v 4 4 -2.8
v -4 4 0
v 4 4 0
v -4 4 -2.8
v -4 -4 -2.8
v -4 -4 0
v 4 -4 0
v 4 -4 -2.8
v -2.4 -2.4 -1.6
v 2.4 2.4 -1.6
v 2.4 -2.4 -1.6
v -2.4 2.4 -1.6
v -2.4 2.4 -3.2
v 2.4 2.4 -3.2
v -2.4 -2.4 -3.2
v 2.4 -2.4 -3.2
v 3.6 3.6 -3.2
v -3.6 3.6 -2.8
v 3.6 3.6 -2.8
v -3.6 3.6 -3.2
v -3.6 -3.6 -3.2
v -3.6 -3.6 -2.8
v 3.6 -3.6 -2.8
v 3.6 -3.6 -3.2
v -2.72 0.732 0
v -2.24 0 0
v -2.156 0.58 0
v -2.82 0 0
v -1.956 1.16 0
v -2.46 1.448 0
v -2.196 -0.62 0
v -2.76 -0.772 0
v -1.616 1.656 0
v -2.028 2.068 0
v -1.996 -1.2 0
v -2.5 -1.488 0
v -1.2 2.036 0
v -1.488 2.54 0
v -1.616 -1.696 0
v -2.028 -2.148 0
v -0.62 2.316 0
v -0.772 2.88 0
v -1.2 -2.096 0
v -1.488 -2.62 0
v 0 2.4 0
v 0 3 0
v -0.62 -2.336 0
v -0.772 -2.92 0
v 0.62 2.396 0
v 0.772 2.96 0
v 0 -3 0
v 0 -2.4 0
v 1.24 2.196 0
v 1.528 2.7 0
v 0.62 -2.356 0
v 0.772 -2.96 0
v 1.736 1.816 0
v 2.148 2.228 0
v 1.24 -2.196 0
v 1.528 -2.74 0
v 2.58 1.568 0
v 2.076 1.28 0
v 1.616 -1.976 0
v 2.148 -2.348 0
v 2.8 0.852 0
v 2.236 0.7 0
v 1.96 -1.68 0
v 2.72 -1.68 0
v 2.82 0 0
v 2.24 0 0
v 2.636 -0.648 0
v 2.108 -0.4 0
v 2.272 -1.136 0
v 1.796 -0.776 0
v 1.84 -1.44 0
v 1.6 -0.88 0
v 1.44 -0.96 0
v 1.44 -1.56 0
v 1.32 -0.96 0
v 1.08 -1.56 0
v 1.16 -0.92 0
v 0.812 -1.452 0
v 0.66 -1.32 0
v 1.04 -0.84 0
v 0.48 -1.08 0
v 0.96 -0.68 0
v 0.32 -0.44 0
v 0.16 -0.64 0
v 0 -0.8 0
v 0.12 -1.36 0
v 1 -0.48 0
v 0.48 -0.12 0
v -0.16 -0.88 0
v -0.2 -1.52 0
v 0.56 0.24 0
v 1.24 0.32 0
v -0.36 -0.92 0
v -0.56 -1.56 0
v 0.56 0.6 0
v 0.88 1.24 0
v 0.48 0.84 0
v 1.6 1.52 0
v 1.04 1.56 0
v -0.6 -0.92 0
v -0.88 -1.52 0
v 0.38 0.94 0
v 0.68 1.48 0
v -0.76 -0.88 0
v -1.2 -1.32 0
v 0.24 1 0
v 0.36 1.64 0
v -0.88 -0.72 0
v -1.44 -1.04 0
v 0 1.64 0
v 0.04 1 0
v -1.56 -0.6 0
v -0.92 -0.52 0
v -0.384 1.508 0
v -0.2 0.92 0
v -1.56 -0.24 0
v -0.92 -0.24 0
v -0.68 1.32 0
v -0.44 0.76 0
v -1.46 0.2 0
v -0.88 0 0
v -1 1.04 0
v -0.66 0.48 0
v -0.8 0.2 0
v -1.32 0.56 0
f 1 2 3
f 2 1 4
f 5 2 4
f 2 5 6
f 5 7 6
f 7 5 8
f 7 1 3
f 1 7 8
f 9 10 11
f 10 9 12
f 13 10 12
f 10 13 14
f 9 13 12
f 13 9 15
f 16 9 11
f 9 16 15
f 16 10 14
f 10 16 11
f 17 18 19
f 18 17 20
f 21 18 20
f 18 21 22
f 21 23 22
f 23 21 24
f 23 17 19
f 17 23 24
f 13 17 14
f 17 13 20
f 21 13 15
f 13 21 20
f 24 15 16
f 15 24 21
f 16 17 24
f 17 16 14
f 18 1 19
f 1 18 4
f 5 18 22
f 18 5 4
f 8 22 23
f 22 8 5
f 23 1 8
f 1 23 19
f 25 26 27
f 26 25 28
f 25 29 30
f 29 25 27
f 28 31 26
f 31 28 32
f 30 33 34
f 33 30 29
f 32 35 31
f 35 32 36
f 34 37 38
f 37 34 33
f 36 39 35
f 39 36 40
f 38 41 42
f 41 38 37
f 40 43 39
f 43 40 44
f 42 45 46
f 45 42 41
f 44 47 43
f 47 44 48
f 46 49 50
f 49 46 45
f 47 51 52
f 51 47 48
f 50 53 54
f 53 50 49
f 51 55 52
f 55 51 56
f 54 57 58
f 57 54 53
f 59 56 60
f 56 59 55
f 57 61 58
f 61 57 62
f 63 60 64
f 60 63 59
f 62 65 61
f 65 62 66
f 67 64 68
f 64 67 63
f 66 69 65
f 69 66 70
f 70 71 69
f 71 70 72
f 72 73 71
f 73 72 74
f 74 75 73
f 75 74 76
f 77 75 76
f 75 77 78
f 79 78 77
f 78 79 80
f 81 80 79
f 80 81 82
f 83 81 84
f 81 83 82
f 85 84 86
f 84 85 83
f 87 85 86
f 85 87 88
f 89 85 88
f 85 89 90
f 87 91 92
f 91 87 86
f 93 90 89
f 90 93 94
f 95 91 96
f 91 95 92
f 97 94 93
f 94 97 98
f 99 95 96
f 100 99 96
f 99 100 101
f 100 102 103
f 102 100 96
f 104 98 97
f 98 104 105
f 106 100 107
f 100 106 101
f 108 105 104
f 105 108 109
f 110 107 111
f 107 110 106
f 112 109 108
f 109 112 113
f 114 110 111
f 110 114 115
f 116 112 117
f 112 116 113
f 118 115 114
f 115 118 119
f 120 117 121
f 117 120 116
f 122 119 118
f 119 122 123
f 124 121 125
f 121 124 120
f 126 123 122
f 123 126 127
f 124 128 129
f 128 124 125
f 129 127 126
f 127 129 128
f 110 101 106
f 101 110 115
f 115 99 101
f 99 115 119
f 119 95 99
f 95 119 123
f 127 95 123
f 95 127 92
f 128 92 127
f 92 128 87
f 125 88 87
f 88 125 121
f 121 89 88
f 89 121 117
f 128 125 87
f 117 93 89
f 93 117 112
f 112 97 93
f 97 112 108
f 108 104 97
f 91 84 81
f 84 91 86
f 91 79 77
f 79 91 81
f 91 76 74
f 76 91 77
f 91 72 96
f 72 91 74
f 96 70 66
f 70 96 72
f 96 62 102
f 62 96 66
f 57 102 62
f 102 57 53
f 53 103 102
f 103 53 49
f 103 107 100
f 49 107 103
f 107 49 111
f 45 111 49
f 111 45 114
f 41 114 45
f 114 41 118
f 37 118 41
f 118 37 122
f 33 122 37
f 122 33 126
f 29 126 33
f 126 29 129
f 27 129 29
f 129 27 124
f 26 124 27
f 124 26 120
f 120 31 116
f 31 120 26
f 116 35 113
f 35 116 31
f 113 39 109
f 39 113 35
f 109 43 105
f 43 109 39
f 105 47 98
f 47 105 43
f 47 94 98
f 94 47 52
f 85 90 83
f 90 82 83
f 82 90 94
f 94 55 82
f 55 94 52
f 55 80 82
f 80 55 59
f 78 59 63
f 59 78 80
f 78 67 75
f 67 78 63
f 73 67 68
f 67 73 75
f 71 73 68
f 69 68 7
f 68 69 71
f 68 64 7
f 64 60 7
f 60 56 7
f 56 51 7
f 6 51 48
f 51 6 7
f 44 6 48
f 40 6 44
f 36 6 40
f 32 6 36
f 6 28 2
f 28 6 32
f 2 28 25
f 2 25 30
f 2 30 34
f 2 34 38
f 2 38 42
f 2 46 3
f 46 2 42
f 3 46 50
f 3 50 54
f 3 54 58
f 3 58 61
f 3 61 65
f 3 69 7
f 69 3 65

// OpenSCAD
// file: ../p/box5.scad
use <../lib.scad>
function ldraw_lib__box5() = [
// 0 Box with 5 Faces and All Edges
// 0 Name: box5.dat
// 0 Author: James Jessiman
// 0 !LDRAW_ORG Primitive UPDATE 2012-01
// 0 !LICENSE Licensed under CC BY 4.0 : see CAreadme.txt
// 
// 0 BFC CERTIFY CCW
  [0,"BFC","CERTIFY"],
  [0,"BFC","CCW"],
// 
// 0 !HISTORY 2002-04-03 [sbliss] Modified for BFC compliance
// 0 !HISTORY 2002-04-25 [PTadmin] Official Update 2002-02
// 0 !HISTORY 2007-06-24 [PTadmin] Header formatted for Contributor Agreement
// 0 !HISTORY 2008-07-01 [PTadmin] Official Update 2008-01
// 0 !HISTORY 2012-02-16 [Philo] Changed to CCW
// 0 !HISTORY 2012-03-30 [PTadmin] Official Update 2012-01
// 
// 
// 2 24 1 1 1 -1 1 1
  [2,24,1,1,1,-1,1,1],
// 2 24 -1 1 1 -1 1 -1
  [2,24,-1,1,1,-1,1,-1],
// 2 24 -1 1 -1 1 1 -1
  [2,24,-1,1,-1,1,1,-1],
// 2 24 1 1 -1 1 1 1
  [2,24,1,1,-1,1,1,1],
// 2 24 1 0 1 -1 0 1
  [2,24,1,0,1,-1,0,1],
// 2 24 -1 0 1 -1 0 -1
  [2,24,-1,0,1,-1,0,-1],
// 2 24 -1 0 -1 1 0 -1
  [2,24,-1,0,-1,1,0,-1],
// 2 24 1 0 -1 1 0 1
  [2,24,1,0,-1,1,0,1],
// 2 24 1 0 1 1 1 1
  [2,24,1,0,1,1,1,1],
// 2 24 -1 0 1 -1 1 1
  [2,24,-1,0,1,-1,1,1],
// 2 24 1 0 -1 1 1 -1
  [2,24,1,0,-1,1,1,-1],
// 2 24 -1 0 -1 -1 1 -1
  [2,24,-1,0,-1,-1,1,-1],
// 4 16 -1 1 1 1 1 1 1 1 -1 -1 1 -1
  [4,16,-1,1,1,1,1,1,1,1,-1,-1,1,-1],
// 4 16 -1 1 1 -1 0 1 1 0 1 1 1 1
  [4,16,-1,1,1,-1,0,1,1,0,1,1,1,1],
// 4 16 -1 1 -1 -1 0 -1 -1 0 1 -1 1 1
  [4,16,-1,1,-1,-1,0,-1,-1,0,1,-1,1,1],
// 4 16 1 1 -1 1 0 -1 -1 0 -1 -1 1 -1
  [4,16,1,1,-1,1,0,-1,-1,0,-1,-1,1,-1],
// 4 16 1 1 1 1 0 1 1 0 -1 1 1 -1
  [4,16,1,1,1,1,0,1,1,0,-1,1,1,-1],
];
module ldraw_lib__box5(step=0, col=false, unit=2/5, alt=false, line=0.2, solid=!$preview)
    makepoly(ldraw_lib__box5(), step=step, col=col, unit=unit, alt=alt, line=line, solid=solid);
ldraw_lib__box5(line=0.2);
// file: ../p/box4.scad
use <../lib.scad>
function ldraw_lib__box4() = [
// 0 Box with 4 Faces (2 Parallel Pairs) and All Edges
// 0 Name: box4.dat
// 0 Author: James Jessiman
// 0 !LDRAW_ORG Primitive UPDATE 2012-01
// 0 !LICENSE Licensed under CC BY 4.0 : see CAreadme.txt
// 
// 0 BFC CERTIFY CCW
  [0,"BFC","CERTIFY"],
  [0,"BFC","CCW"],
// 
// 0 !HISTORY 2002-04-03 [sbliss] Modified for BFC compliance
// 0 !HISTORY 2002-04-25 [PTadmin] Official Update 2002-02
// 0 !HISTORY 2007-06-24 [PTadmin] Header formatted for Contributor Agreement
// 0 !HISTORY 2008-07-01 [PTadmin] Official Update 2008-01
// 0 !HISTORY 2012-02-16 [Philo] Changed to CCW
// 0 !HISTORY 2012-03-30 [PTadmin] Official Update 2012-01
// 
// 
// 2 24 1 1 1 -1 1 1
  [2,24,1,1,1,-1,1,1],
// 2 24 -1 1 1 -1 1 -1
  [2,24,-1,1,1,-1,1,-1],
// 2 24 -1 1 -1 1 1 -1
  [2,24,-1,1,-1,1,1,-1],
// 2 24 1 1 -1 1 1 1
  [2,24,1,1,-1,1,1,1],
// 2 24 1 0 1 -1 0 1
  [2,24,1,0,1,-1,0,1],
// 2 24 -1 0 1 -1 0 -1
  [2,24,-1,0,1,-1,0,-1],
// 2 24 -1 0 -1 1 0 -1
  [2,24,-1,0,-1,1,0,-1],
// 2 24 1 0 -1 1 0 1
  [2,24,1,0,-1,1,0,1],
// 2 24 1 0 1 1 1 1
  [2,24,1,0,1,1,1,1],
// 2 24 -1 0 1 -1 1 1
  [2,24,-1,0,1,-1,1,1],
// 2 24 1 0 -1 1 1 -1
  [2,24,1,0,-1,1,1,-1],
// 2 24 -1 0 -1 -1 1 -1
  [2,24,-1,0,-1,-1,1,-1],
// 4 16 -1 1 1 -1 0 1 1 0 1 1 1 1
  [4,16,-1,1,1,-1,0,1,1,0,1,1,1,1],
// 4 16 -1 1 -1 -1 0 -1 -1 0 1 -1 1 1
  [4,16,-1,1,-1,-1,0,-1,-1,0,1,-1,1,1],
// 4 16 1 1 -1 1 0 -1 -1 0 -1 -1 1 -1
  [4,16,1,1,-1,1,0,-1,-1,0,-1,-1,1,-1],
// 4 16 1 1 1 1 0 1 1 0 -1 1 1 -1
  [4,16,1,1,1,1,0,1,1,0,-1,1,1,-1],
];
module ldraw_lib__box4(step=0, col=false, unit=2/5, alt=false, line=0.2, solid=!$preview)
    makepoly(ldraw_lib__box4(), step=step, col=col, unit=unit, alt=alt, line=line, solid=solid);
ldraw_lib__box4(line=0.2);
// file: s/3070bs01.scad
use <../../lib.scad>
use <../../p/box4.scad>
use <../../p/box5.scad>
function ldraw_lib__s__3070bs01() = [
// 0 ~Tile  1 x  1 with Groove without Top Face
// 0 Name: s\3070bs01.dat
// 0 Author: Chris Dee [cwdee]
// 0 !LDRAW_ORG Subpart UPDATE 2009-02
// 0 !LICENSE Licensed under CC BY 4.0 : see CAreadme.txt
// 
// 0 BFC CERTIFY CCW
  [0,"BFC","CERTIFY"],
  [0,"BFC","CCW"],
// 
// 0 !HISTORY 2009-09-03 [PTadmin] Official Update 2009-02
// 
// 
// 1 16 0 0 0 10 0 0 0 7 0 0 0 10 box4.dat
  [1,16,0,0,0,10,0,0,0,7,0,0,0,10, ldraw_lib__box4()],
// 0 BFC INVERTNEXT
  [0,"BFC","INVERTNEXT"],
// 1 16 0 8 0 6 0 0 0 -4 0 0 0 6 box5.dat
  [1,16,0,8,0,6,0,0,0,-4,0,0,0,6, ldraw_lib__box5()],
// 1 16 0 7 0 9 0 0 0 1 0 0 0 9 box4.dat
  [1,16,0,7,0,9,0,0,0,1,0,0,0,9, ldraw_lib__box4()],
// 
// 4 16 9 8 9 6 8 6 -6 8 6 -9 8 9
  [4,16,9,8,9,6,8,6,-6,8,6,-9,8,9],
// 4 16 -9 8 9 -6 8 6 -6 8 -6 -9 8 -9
  [4,16,-9,8,9,-6,8,6,-6,8,-6,-9,8,-9],
// 4 16 -9 8 -9 -6 8 -6 6 8 -6 9 8 -9
  [4,16,-9,8,-9,-6,8,-6,6,8,-6,9,8,-9],
// 4 16 9 8 -9 6 8 -6 6 8 6 9 8 9
  [4,16,9,8,-9,6,8,-6,6,8,6,9,8,9],
// 
// 4 16 10 7 10 9 7 9 -9 7 9 -10 7 10
  [4,16,10,7,10,9,7,9,-9,7,9,-10,7,10],
// 4 16 -10 7 10 -9 7 9 -9 7 -9 -10 7 -10
  [4,16,-10,7,10,-9,7,9,-9,7,-9,-10,7,-10],
// 4 16 -10 7 -10 -9 7 -9 9 7 -9 10 7 -10
  [4,16,-10,7,-10,-9,7,-9,9,7,-9,10,7,-10],
// 4 16 10 7 -10 9 7 -9 9 7 9 10 7 10
  [4,16,10,7,-10,9,7,-9,9,7,9,10,7,10],
// 0
];
module ldraw_lib__s__3070bs01(step=0, col=false, unit=2/5, alt=false, line=0.2, solid=!$preview)
    makepoly(ldraw_lib__s__3070bs01(), step=step, col=col, unit=unit, alt=alt, line=line, solid=solid);
ldraw_lib__s__3070bs01(line=0.2);
// main file
use <../lib.scad>
use <s/3070bs01.scad>
function ldraw_lib__3070bpuj() = [
// 0 Tile  1 x  1 with Silver "@" Pattern
// 0 Name: 3070bpuj.dat
// 0 Author: Magnus Forsberg [MagFors]
// 0 !LDRAW_ORG Part UPDATE 2015-02
// 0 !LICENSE Licensed under CC BY 4.0 : see CAreadme.txt
// 
// 0 BFC CERTIFY CCW
  [0,"BFC","CERTIFY"],
  [0,"BFC","CCW"],
// 
// 0 !KEYWORDS arobase, arroba, at, at sign, BrickLink 3070pb072, Commercial at
// 0 !KEYWORDS Rebrickable 3070bpr0102, Set 850425
// 
// 0 !HISTORY 2015-12-30 [PTadmin] Official Update 2015-02
// 
// 
// 1 16 0 0 0 1 0 0 0 1 0 0 0 1 s\3070bs01.dat
  [1,16,0,0,0,1,0,0,0,1,0,0,0,1, ldraw_lib__s__3070bs01()],
// 
// 4 80 -5.6 0 0 -5.39 0 1.45 -6.8 0 1.83 -7.05 0 0
  [4,80,-5.6,0,0,-5.39,0,1.45,-6.8,0,1.83,-7.05,0,0],
// 4 80 -6.15 0 3.62 -6.8 0 1.83 -5.39 0 1.45 -4.89 0 2.9
  [4,80,-6.15,0,3.62,-6.8,0,1.83,-5.39,0,1.45,-4.89,0,2.9],
// 4 80 -5.49 0 -1.55 -5.6 0 0 -7.05 0 0 -6.9 0 -1.93
  [4,80,-5.49,0,-1.55,-5.6,0,0,-7.05,0,0,-6.9,0,-1.93],
// 4 80 -5.07 0 5.17 -6.15 0 3.62 -4.89 0 2.9 -4.04 0 4.14
  [4,80,-5.07,0,5.17,-6.15,0,3.62,-4.89,0,2.9,-4.04,0,4.14],
// 4 80 -4.99 0 -3 -5.49 0 -1.55 -6.9 0 -1.93 -6.25 0 -3.72
  [4,80,-4.99,0,-3,-5.49,0,-1.55,-6.9,0,-1.93,-6.25,0,-3.72],
// 4 80 -3.72 0 6.35 -5.07 0 5.17 -4.04 0 4.14 -3 0 5.09
  [4,80,-3.72,0,6.35,-5.07,0,5.17,-4.04,0,4.14,-3,0,5.09],
// 4 80 -4.04 0 -4.24 -4.99 0 -3 -6.25 0 -3.72 -5.07 0 -5.37
  [4,80,-4.04,0,-4.24,-4.99,0,-3,-6.25,0,-3.72,-5.07,0,-5.37],
// 4 80 -1.93 0 7.2 -3.72 0 6.35 -3 0 5.09 -1.55 0 5.79
  [4,80,-1.93,0,7.2,-3.72,0,6.35,-3,0,5.09,-1.55,0,5.79],
// 4 80 -3 0 -5.24 -4.04 0 -4.24 -5.07 0 -5.37 -3.72 0 -6.55
  [4,80,-3,0,-5.24,-4.04,0,-4.24,-5.07,0,-5.37,-3.72,0,-6.55],
// 4 80 0 0 7.5 -1.93 0 7.2 -1.55 0 5.79 0 0 6
  [4,80,0,0,7.5,-1.93,0,7.2,-1.55,0,5.79,0,0,6],
// 4 80 -1.55 0 -5.84 -3 0 -5.24 -3.72 0 -6.55 -1.93 0 -7.3
  [4,80,-1.55,0,-5.84,-3,0,-5.24,-3.72,0,-6.55,-1.93,0,-7.3],
// 4 80 1.93 0 7.4 0 0 7.5 0 0 6 1.55 0 5.99
  [4,80,1.93,0,7.4,0,0,7.5,0,0,6,1.55,0,5.99],
// 4 80 0 0 -6 -1.55 0 -5.84 -1.93 0 -7.3 0 0 -7.5
  [4,80,0,0,-6,-1.55,0,-5.84,-1.93,0,-7.3,0,0,-7.5],
// 4 80 3.82 0 6.75 1.93 0 7.4 1.55 0 5.99 3.1 0 5.49
  [4,80,3.82,0,6.75,1.93,0,7.4,1.55,0,5.99,3.1,0,5.49],
// 4 80 1.55 0 -5.89 0 0 -6 0 0 -7.5 1.93 0 -7.4
  [4,80,1.55,0,-5.89,0,0,-6,0,0,-7.5,1.93,0,-7.4],
// 4 80 5.37 0 5.57 3.82 0 6.75 3.1 0 5.49 4.34 0 4.54
  [4,80,5.37,0,5.57,3.82,0,6.75,3.1,0,5.49,4.34,0,4.54],
// 4 80 3.1 0 -5.49 1.55 0 -5.89 1.93 0 -7.4 3.82 0 -6.85
  [4,80,3.1,0,-5.49,1.55,0,-5.89,1.93,0,-7.4,3.82,0,-6.85],
// 4 80 6.45 0 3.92 5.37 0 5.57 4.34 0 4.54 5.19 0 3.2
  [4,80,6.45,0,3.92,5.37,0,5.57,4.34,0,4.54,5.19,0,3.2],
// 4 80 4.04 0 -4.94 3.1 0 -5.49 3.82 0 -6.85 5.37 0 -5.87
  [4,80,4.04,0,-4.94,3.1,0,-5.49,3.82,0,-6.85,5.37,0,-5.87],
// 4 80 7 0 2.13 6.45 0 3.92 5.19 0 3.2 5.59 0 1.75
  [4,80,7,0,2.13,6.45,0,3.92,5.19,0,3.2,5.59,0,1.75],
// 4 80 4.9 0 -4.2 4.04 0 -4.94 5.37 0 -5.87 6.8 0 -4.2
  [4,80,4.9,0,-4.2,4.04,0,-4.94,5.37,0,-5.87,6.8,0,-4.2],
// 4 80 7.05 0 0 7 0 2.13 5.59 0 1.75 5.6 0 0
  [4,80,7.05,0,0,7,0,2.13,5.59,0,1.75,5.6,0,0],
// 4 80 6.59 0 -1.62 7.05 0 0 5.6 0 0 5.27 0 -1
  [4,80,6.59,0,-1.62,7.05,0,0,5.6,0,0,5.27,0,-1],
// 4 80 5.68 0 -2.84 6.59 0 -1.62 5.27 0 -1 4.49 0 -1.94
  [4,80,5.68,0,-2.84,6.59,0,-1.62,5.27,0,-1,4.49,0,-1.94],
// 4 80 4 0 -2.2 4.6 0 -3.6 5.68 0 -2.84 4.49 0 -1.94
  [4,80,4,0,-2.2,4.6,0,-3.6,5.68,0,-2.84,4.49,0,-1.94],
// 4 80 4.6 0 -3.6 4 0 -2.2 3.6 0 -2.4 3.6 0 -3.9
  [4,80,4.6,0,-3.6,4,0,-2.2,3.6,0,-2.4,3.6,0,-3.9],
// 4 80 3.6 0 -3.9 3.6 0 -2.4 3.3 0 -2.4 2.7 0 -3.9
  [4,80,3.6,0,-3.9,3.6,0,-2.4,3.3,0,-2.4,2.7,0,-3.9],
// 4 80 2.7 0 -3.9 3.3 0 -2.4 2.9 0 -2.3 2.03 0 -3.63
  [4,80,2.7,0,-3.9,3.3,0,-2.4,2.9,0,-2.3,2.03,0,-3.63],
// 4 80 2.9 0 -2.3 2.6 0 -2.1 1.65 0 -3.3 2.03 0 -3.63
  [4,80,2.9,0,-2.3,2.6,0,-2.1,1.65,0,-3.3,2.03,0,-3.63],
// 4 80 1.2 0 -2.7 1.65 0 -3.3 2.6 0 -2.1 2.4 0 -1.7
  [4,80,1.2,0,-2.7,1.65,0,-3.3,2.6,0,-2.1,2.4,0,-1.7],
// 4 80 1.2 0 -2.7 2.4 0 -1.7 0.8 0 -1.1 0.4 0 -1.6
  [4,80,1.2,0,-2.7,2.4,0,-1.7,0.8,0,-1.1,0.4,0,-1.6],
// 4 80 0 0 -2 0.3 0 -3.4 1.2 0 -2.7 0.4 0 -1.6
  [4,80,0,0,-2,0.3,0,-3.4,1.2,0,-2.7,0.4,0,-1.6],
// 4 80 0.8 0 -1.1 2.4 0 -1.7 2.5 0 -1.2 1.2 0 -0.3
  [4,80,0.8,0,-1.1,2.4,0,-1.7,2.5,0,-1.2,1.2,0,-0.3],
// 4 80 0.3 0 -3.4 0 0 -2 -0.4 0 -2.2 -0.5 0 -3.8
  [4,80,0.3,0,-3.4,0,0,-2,-0.4,0,-2.2,-0.5,0,-3.8],
// 4 80 1.4 0 0.6 1.2 0 -0.3 2.5 0 -1.2 3.1 0 0.8
  [4,80,1.4,0,0.6,1.2,0,-0.3,2.5,0,-1.2,3.1,0,0.8],
// 4 80 -0.5 0 -3.8 -0.4 0 -2.2 -0.9 0 -2.3 -1.4 0 -3.9
  [4,80,-0.5,0,-3.8,-0.4,0,-2.2,-0.9,0,-2.3,-1.4,0,-3.9],
// 3 80 1.4 0 1.5 1.4 0 0.6 3.1 0 0.8
  [3,80,1.4,0,1.5,1.4,0,0.6,3.1,0,0.8],
// 4 80 1.2 0 2.1 1.4 0 1.5 3.1 0 0.8 2.2 0 3.1
  [4,80,1.2,0,2.1,1.4,0,1.5,3.1,0,0.8,2.2,0,3.1],
// 4 80 2.6 0 3.9 2.2 0 3.1 3.1 0 0.8 4 0 3.8
  [4,80,2.6,0,3.9,2.2,0,3.1,3.1,0,0.8,4,0,3.8],
// 4 80 -1.4 0 -3.9 -0.9 0 -2.3 -1.5 0 -2.3 -2.2 0 -3.8
  [4,80,-1.4,0,-3.9,-0.9,0,-2.3,-1.5,0,-2.3,-2.2,0,-3.8],
// 4 80 0.95 0 2.35 1.2 0 2.1 2.2 0 3.1 1.7 0 3.7
  [4,80,0.95,0,2.35,1.2,0,2.1,2.2,0,3.1,1.7,0,3.7],
// 4 80 -2.2 0 -3.8 -1.5 0 -2.3 -1.9 0 -2.2 -3 0 -3.3
  [4,80,-2.2,0,-3.8,-1.5,0,-2.3,-1.9,0,-2.2,-3,0,-3.3],
// 4 80 0.6 0 2.5 0.95 0 2.35 1.7 0 3.7 0.9 0 4.1
  [4,80,0.6,0,2.5,0.95,0,2.35,1.7,0,3.7,0.9,0,4.1],
// 4 80 -3 0 -3.3 -1.9 0 -2.2 -2.2 0 -1.8 -3.6 0 -2.6
  [4,80,-3,0,-3.3,-1.9,0,-2.2,-2.2,0,-1.8,-3.6,0,-2.6],
// 4 80 0.1 0 2.5 0.6 0 2.5 0.9 0 4.1 0 0 4.1
  [4,80,0.1,0,2.5,0.6,0,2.5,0.9,0,4.1,0,0,4.1],
// 4 80 -3.6 0 -2.6 -2.2 0 -1.8 -2.3 0 -1.3 -3.9 0 -1.5
  [4,80,-3.6,0,-2.6,-2.2,0,-1.8,-2.3,0,-1.3,-3.9,0,-1.5],
// 4 80 -0.5 0 2.3 0.1 0 2.5 0 0 4.1 -0.96 0 3.77
  [4,80,-0.5,0,2.3,0.1,0,2.5,0,0,4.1,-0.96,0,3.77],
// 4 80 -3.9 0 -1.5 -2.3 0 -1.3 -2.3 0 -0.6 -3.9 0 -0.6
  [4,80,-3.9,0,-1.5,-2.3,0,-1.3,-2.3,0,-0.6,-3.9,0,-0.6],
// 4 80 -1.7 0 3.3 -1.1 0 1.9 -0.5 0 2.3 -0.96 0 3.77
  [4,80,-1.7,0,3.3,-1.1,0,1.9,-0.5,0,2.3,-0.96,0,3.77],
// 4 80 -3.9 0 -0.6 -2.3 0 -0.6 -2.2 0 0 -3.65 0 0.5
  [4,80,-3.9,0,-0.6,-2.3,0,-0.6,-2.2,0,0,-3.65,0,0.5],
// 4 80 -1.1 0 1.9 -1.7 0 3.3 -2.5 0 2.6 -1.65 0 1.2
  [4,80,-1.1,0,1.9,-1.7,0,3.3,-2.5,0,2.6,-1.65,0,1.2],
// 4 80 -3.65 0 0.5 -2.2 0 0 -2 0 0.5 -3.3 0 1.4
  [4,80,-3.65,0,0.5,-2.2,0,0,-2,0,0.5,-3.3,0,1.4],
// 4 80 -1.65 0 1.2 -2.5 0 2.6 -3.3 0 1.4 -2 0 0.5
  [4,80,-1.65,0,1.2,-2.5,0,2.6,-3.3,0,1.4,-2,0,0.5],
// 
// 4 16 0.1 0 2.5 1.2 0 2.1 0.95 0 2.35 0.6 0 2.5
  [4,16,0.1,0,2.5,1.2,0,2.1,0.95,0,2.35,0.6,0,2.5],
// 4 16 -0.5 0 2.3 1.4 0 1.5 1.2 0 2.1 0.1 0 2.5
  [4,16,-0.5,0,2.3,1.4,0,1.5,1.2,0,2.1,0.1,0,2.5],
// 4 16 -1.1 0 1.9 1.4 0 0.6 1.4 0 1.5 -0.5 0 2.3
  [4,16,-1.1,0,1.9,1.4,0,0.6,1.4,0,1.5,-0.5,0,2.3],
// 4 16 -1.65 0 1.2 1.2 0 -0.3 1.4 0 0.6 -1.1 0 1.9
  [4,16,-1.65,0,1.2,1.2,0,-0.3,1.4,0,0.6,-1.1,0,1.9],
// 4 16 -2 0 0.5 0.8 0 -1.1 1.2 0 -0.3 -1.65 0 1.2
  [4,16,-2,0,0.5,0.8,0,-1.1,1.2,0,-0.3,-1.65,0,1.2],
// 4 16 0.4 0 -1.6 0.8 0 -1.1 -2.2 0 0 -2.3 0 -0.6
  [4,16,0.4,0,-1.6,0.8,0,-1.1,-2.2,0,0,-2.3,0,-0.6],
// 4 16 0 0 -2 0.4 0 -1.6 -2.3 0 -0.6 -2.3 0 -1.3
  [4,16,0,0,-2,0.4,0,-1.6,-2.3,0,-0.6,-2.3,0,-1.3],
// 3 16 -2 0 0.5 -2.2 0 0 0.8 0 -1.1
  [3,16,-2,0,0.5,-2.2,0,0,0.8,0,-1.1],
// 4 16 -0.4 0 -2.2 0 0 -2 -2.3 0 -1.3 -2.2 0 -1.8
  [4,16,-0.4,0,-2.2,0,0,-2,-2.3,0,-1.3,-2.2,0,-1.8],
// 4 16 -0.9 0 -2.3 -0.4 0 -2.2 -2.2 0 -1.8 -1.9 0 -2.2
  [4,16,-0.9,0,-2.3,-0.4,0,-2.2,-2.2,0,-1.8,-1.9,0,-2.2],
// 3 16 -1.9 0 -2.2 -1.5 0 -2.3 -0.9 0 -2.3
  [3,16,-1.9,0,-2.2,-1.5,0,-2.3,-0.9,0,-2.3],
// 4 16 2.4 0 -1.7 2.6 0 -2.1 2.9 0 -2.3 2.5 0 -1.2
  [4,16,2.4,0,-1.7,2.6,0,-2.1,2.9,0,-2.3,2.5,0,-1.2],
// 4 16 2.9 0 -2.3 3.3 0 -2.4 3.6 0 -2.4 2.5 0 -1.2
  [4,16,2.9,0,-2.3,3.3,0,-2.4,3.6,0,-2.4,2.5,0,-1.2],
// 4 16 3.6 0 -2.4 4 0 -2.2 4.49 0 -1.94 2.5 0 -1.2
  [4,16,3.6,0,-2.4,4,0,-2.2,4.49,0,-1.94,2.5,0,-1.2],
// 4 16 2.5 0 -1.2 4.49 0 -1.94 5.27 0 -1 3.1 0 0.8
  [4,16,2.5,0,-1.2,4.49,0,-1.94,5.27,0,-1,3.1,0,0.8],
// 4 16 3.1 0 0.8 5.27 0 -1 5.6 0 0 5.59 0 1.75
  [4,16,3.1,0,0.8,5.27,0,-1,5.6,0,0,5.59,0,1.75],
// 4 16 4 0 3.8 3.1 0 0.8 5.59 0 1.75 5.19 0 3.2
  [4,16,4,0,3.8,3.1,0,0.8,5.59,0,1.75,5.19,0,3.2],
// 4 16 4 0 3.8 5.19 0 3.2 4.34 0 4.54 3.1 0 5.49
  [4,16,4,0,3.8,5.19,0,3.2,4.34,0,4.54,3.1,0,5.49],
// 4 16 2.6 0 3.9 4 0 3.8 3.1 0 5.49 1.55 0 5.99
  [4,16,2.6,0,3.9,4,0,3.8,3.1,0,5.49,1.55,0,5.99],
// 3 16 2.6 0 3.9 1.7 0 3.7 2.2 0 3.1
  [3,16,2.6,0,3.9,1.7,0,3.7,2.2,0,3.1],
// 4 16 0.9 0 4.1 1.7 0 3.7 2.6 0 3.9 1.55 0 5.99
  [4,16,0.9,0,4.1,1.7,0,3.7,2.6,0,3.9,1.55,0,5.99],
// 4 16 0 0 6 0 0 4.1 0.9 0 4.1 1.55 0 5.99
  [4,16,0,0,6,0,0,4.1,0.9,0,4.1,1.55,0,5.99],
// 4 16 -1.55 0 5.79 -0.96 0 3.77 0 0 4.1 0 0 6
  [4,16,-1.55,0,5.79,-0.96,0,3.77,0,0,4.1,0,0,6],
// 4 16 -3 0 5.09 -1.7 0 3.3 -0.96 0 3.77 -1.55 0 5.79
  [4,16,-3,0,5.09,-1.7,0,3.3,-0.96,0,3.77,-1.55,0,5.79],
// 4 16 -4.04 0 4.14 -2.5 0 2.6 -1.7 0 3.3 -3 0 5.09
  [4,16,-4.04,0,4.14,-2.5,0,2.6,-1.7,0,3.3,-3,0,5.09],
// 4 16 -4.04 0 4.14 -4.89 0 2.9 -3.3 0 1.4 -2.5 0 2.6
  [4,16,-4.04,0,4.14,-4.89,0,2.9,-3.3,0,1.4,-2.5,0,2.6],
// 4 16 -5.39 0 1.45 -3.65 0 0.5 -3.3 0 1.4 -4.89 0 2.9
  [4,16,-5.39,0,1.45,-3.65,0,0.5,-3.3,0,1.4,-4.89,0,2.9],
// 4 16 -3.65 0 0.5 -5.39 0 1.45 -5.6 0 0 -3.9 0 -0.6
  [4,16,-3.65,0,0.5,-5.39,0,1.45,-5.6,0,0,-3.9,0,-0.6],
// 4 16 -5.6 0 0 -5.49 0 -1.55 -3.9 0 -1.5 -3.9 0 -0.6
  [4,16,-5.6,0,0,-5.49,0,-1.55,-3.9,0,-1.5,-3.9,0,-0.6],
// 4 16 -5.49 0 -1.55 -4.99 0 -3 -3.6 0 -2.6 -3.9 0 -1.5
  [4,16,-5.49,0,-1.55,-4.99,0,-3,-3.6,0,-2.6,-3.9,0,-1.5],
// 4 16 -4.99 0 -3 -4.04 0 -4.24 -3 0 -3.3 -3.6 0 -2.6
  [4,16,-4.99,0,-3,-4.04,0,-4.24,-3,0,-3.3,-3.6,0,-2.6],
// 4 16 -3 0 -3.3 -4.04 0 -4.24 -3 0 -5.24 -2.2 0 -3.8
  [4,16,-3,0,-3.3,-4.04,0,-4.24,-3,0,-5.24,-2.2,0,-3.8],
// 4 16 -2.2 0 -3.8 -3 0 -5.24 -1.55 0 -5.84 -1.4 0 -3.9
  [4,16,-2.2,0,-3.8,-3,0,-5.24,-1.55,0,-5.84,-1.4,0,-3.9],
// 4 16 -1.4 0 -3.9 -1.55 0 -5.84 0 0 -6 -0.5 0 -3.8
  [4,16,-1.4,0,-3.9,-1.55,0,-5.84,0,0,-6,-0.5,0,-3.8],
// 3 16 1.2 0 -2.7 0.3 0 -3.4 1.65 0 -3.3
  [3,16,1.2,0,-2.7,0.3,0,-3.4,1.65,0,-3.3],
// 4 16 0.3 0 -3.4 -0.5 0 -3.8 2.03 0 -3.63 1.65 0 -3.3
  [4,16,0.3,0,-3.4,-0.5,0,-3.8,2.03,0,-3.63,1.65,0,-3.3],
// 4 16 -0.5 0 -3.8 0 0 -6 1.55 0 -5.89 2.03 0 -3.63
  [4,16,-0.5,0,-3.8,0,0,-6,1.55,0,-5.89,2.03,0,-3.63],
// 4 16 2.03 0 -3.63 1.55 0 -5.89 3.1 0 -5.49 2.7 0 -3.9
  [4,16,2.03,0,-3.63,1.55,0,-5.89,3.1,0,-5.49,2.7,0,-3.9],
// 4 16 2.7 0 -3.9 3.1 0 -5.49 4.04 0 -4.94 3.6 0 -3.9
  [4,16,2.7,0,-3.9,3.1,0,-5.49,4.04,0,-4.94,3.6,0,-3.9],
// 4 16 3.6 0 -3.9 4.04 0 -4.94 4.9 0 -4.2 4.6 0 -3.6
  [4,16,3.6,0,-3.9,4.04,0,-4.94,4.9,0,-4.2,4.6,0,-3.6],
// 4 16 4.6 0 -3.6 4.9 0 -4.2 6.8 0 -4.2 5.68 0 -2.84
  [4,16,4.6,0,-3.6,4.9,0,-4.2,6.8,0,-4.2,5.68,0,-2.84],
// 3 16 6.59 0 -1.62 5.68 0 -2.84 6.8 0 -4.2
  [3,16,6.59,0,-1.62,5.68,0,-2.84,6.8,0,-4.2],
// 4 16 7.05 0 0 6.59 0 -1.62 6.8 0 -4.2 10 0 -10
  [4,16,7.05,0,0,6.59,0,-1.62,6.8,0,-4.2,10,0,-10],
// 3 16 6.8 0 -4.2 5.37 0 -5.87 10 0 -10
  [3,16,6.8,0,-4.2,5.37,0,-5.87,10,0,-10],
// 3 16 5.37 0 -5.87 3.82 0 -6.85 10 0 -10
  [3,16,5.37,0,-5.87,3.82,0,-6.85,10,0,-10],
// 3 16 3.82 0 -6.85 1.93 0 -7.4 10 0 -10
  [3,16,3.82,0,-6.85,1.93,0,-7.4,10,0,-10],
// 3 16 1.93 0 -7.4 0 0 -7.5 10 0 -10
  [3,16,1.93,0,-7.4,0,0,-7.5,10,0,-10],
// 4 16 -1.93 0 -7.3 -10 0 -10 10 0 -10 0 0 -7.5
  [4,16,-1.93,0,-7.3,-10,0,-10,10,0,-10,0,0,-7.5],
// 3 16 -3.72 0 -6.55 -10 0 -10 -1.93 0 -7.3
  [3,16,-3.72,0,-6.55,-10,0,-10,-1.93,0,-7.3],
// 3 16 -5.07 0 -5.37 -10 0 -10 -3.72 0 -6.55
  [3,16,-5.07,0,-5.37,-10,0,-10,-3.72,0,-6.55],
// 3 16 -6.25 0 -3.72 -10 0 -10 -5.07 0 -5.37
  [3,16,-6.25,0,-3.72,-10,0,-10,-5.07,0,-5.37],
// 3 16 -6.9 0 -1.93 -10 0 -10 -6.25 0 -3.72
  [3,16,-6.9,0,-1.93,-10,0,-10,-6.25,0,-3.72],
// 4 16 -10 0 -10 -6.9 0 -1.93 -7.05 0 0 -10 0 10
  [4,16,-10,0,-10,-6.9,0,-1.93,-7.05,0,0,-10,0,10],
// 3 16 -10 0 10 -7.05 0 0 -6.8 0 1.83
  [3,16,-10,0,10,-7.05,0,0,-6.8,0,1.83],
// 3 16 -10 0 10 -6.8 0 1.83 -6.15 0 3.62
  [3,16,-10,0,10,-6.8,0,1.83,-6.15,0,3.62],
// 3 16 -10 0 10 -6.15 0 3.62 -5.07 0 5.17
  [3,16,-10,0,10,-6.15,0,3.62,-5.07,0,5.17],
// 3 16 -10 0 10 -5.07 0 5.17 -3.72 0 6.35
  [3,16,-10,0,10,-5.07,0,5.17,-3.72,0,6.35],
// 3 16 -10 0 10 -3.72 0 6.35 -1.93 0 7.2
  [3,16,-10,0,10,-3.72,0,6.35,-1.93,0,7.2],
// 4 16 -10 0 10 -1.93 0 7.2 0 0 7.5 10 0 10
  [4,16,-10,0,10,-1.93,0,7.2,0,0,7.5,10,0,10],
// 3 16 10 0 10 0 0 7.5 1.93 0 7.4
  [3,16,10,0,10,0,0,7.5,1.93,0,7.4],
// 3 16 10 0 10 1.93 0 7.4 3.82 0 6.75
  [3,16,10,0,10,1.93,0,7.4,3.82,0,6.75],
// 3 16 10 0 10 3.82 0 6.75 5.37 0 5.57
  [3,16,10,0,10,3.82,0,6.75,5.37,0,5.57],
// 3 16 10 0 10 5.37 0 5.57 6.45 0 3.92
  [3,16,10,0,10,5.37,0,5.57,6.45,0,3.92],
// 3 16 10 0 10 6.45 0 3.92 7 0 2.13
  [3,16,10,0,10,6.45,0,3.92,7,0,2.13],
// 4 16 10 0 10 7 0 2.13 7.05 0 0 10 0 -10
  [4,16,10,0,10,7,0,2.13,7.05,0,0,10,0,-10],
];
module ldraw_lib__3070bpuj(step=0, col=false, unit=2/5, alt=false, line=0.2, solid=!$preview)
    makepoly(ldraw_lib__3070bpuj(), step=step, col=col, unit=unit, alt=alt, line=line, solid=solid);
ldraw_lib__3070bpuj(line=0.2);
